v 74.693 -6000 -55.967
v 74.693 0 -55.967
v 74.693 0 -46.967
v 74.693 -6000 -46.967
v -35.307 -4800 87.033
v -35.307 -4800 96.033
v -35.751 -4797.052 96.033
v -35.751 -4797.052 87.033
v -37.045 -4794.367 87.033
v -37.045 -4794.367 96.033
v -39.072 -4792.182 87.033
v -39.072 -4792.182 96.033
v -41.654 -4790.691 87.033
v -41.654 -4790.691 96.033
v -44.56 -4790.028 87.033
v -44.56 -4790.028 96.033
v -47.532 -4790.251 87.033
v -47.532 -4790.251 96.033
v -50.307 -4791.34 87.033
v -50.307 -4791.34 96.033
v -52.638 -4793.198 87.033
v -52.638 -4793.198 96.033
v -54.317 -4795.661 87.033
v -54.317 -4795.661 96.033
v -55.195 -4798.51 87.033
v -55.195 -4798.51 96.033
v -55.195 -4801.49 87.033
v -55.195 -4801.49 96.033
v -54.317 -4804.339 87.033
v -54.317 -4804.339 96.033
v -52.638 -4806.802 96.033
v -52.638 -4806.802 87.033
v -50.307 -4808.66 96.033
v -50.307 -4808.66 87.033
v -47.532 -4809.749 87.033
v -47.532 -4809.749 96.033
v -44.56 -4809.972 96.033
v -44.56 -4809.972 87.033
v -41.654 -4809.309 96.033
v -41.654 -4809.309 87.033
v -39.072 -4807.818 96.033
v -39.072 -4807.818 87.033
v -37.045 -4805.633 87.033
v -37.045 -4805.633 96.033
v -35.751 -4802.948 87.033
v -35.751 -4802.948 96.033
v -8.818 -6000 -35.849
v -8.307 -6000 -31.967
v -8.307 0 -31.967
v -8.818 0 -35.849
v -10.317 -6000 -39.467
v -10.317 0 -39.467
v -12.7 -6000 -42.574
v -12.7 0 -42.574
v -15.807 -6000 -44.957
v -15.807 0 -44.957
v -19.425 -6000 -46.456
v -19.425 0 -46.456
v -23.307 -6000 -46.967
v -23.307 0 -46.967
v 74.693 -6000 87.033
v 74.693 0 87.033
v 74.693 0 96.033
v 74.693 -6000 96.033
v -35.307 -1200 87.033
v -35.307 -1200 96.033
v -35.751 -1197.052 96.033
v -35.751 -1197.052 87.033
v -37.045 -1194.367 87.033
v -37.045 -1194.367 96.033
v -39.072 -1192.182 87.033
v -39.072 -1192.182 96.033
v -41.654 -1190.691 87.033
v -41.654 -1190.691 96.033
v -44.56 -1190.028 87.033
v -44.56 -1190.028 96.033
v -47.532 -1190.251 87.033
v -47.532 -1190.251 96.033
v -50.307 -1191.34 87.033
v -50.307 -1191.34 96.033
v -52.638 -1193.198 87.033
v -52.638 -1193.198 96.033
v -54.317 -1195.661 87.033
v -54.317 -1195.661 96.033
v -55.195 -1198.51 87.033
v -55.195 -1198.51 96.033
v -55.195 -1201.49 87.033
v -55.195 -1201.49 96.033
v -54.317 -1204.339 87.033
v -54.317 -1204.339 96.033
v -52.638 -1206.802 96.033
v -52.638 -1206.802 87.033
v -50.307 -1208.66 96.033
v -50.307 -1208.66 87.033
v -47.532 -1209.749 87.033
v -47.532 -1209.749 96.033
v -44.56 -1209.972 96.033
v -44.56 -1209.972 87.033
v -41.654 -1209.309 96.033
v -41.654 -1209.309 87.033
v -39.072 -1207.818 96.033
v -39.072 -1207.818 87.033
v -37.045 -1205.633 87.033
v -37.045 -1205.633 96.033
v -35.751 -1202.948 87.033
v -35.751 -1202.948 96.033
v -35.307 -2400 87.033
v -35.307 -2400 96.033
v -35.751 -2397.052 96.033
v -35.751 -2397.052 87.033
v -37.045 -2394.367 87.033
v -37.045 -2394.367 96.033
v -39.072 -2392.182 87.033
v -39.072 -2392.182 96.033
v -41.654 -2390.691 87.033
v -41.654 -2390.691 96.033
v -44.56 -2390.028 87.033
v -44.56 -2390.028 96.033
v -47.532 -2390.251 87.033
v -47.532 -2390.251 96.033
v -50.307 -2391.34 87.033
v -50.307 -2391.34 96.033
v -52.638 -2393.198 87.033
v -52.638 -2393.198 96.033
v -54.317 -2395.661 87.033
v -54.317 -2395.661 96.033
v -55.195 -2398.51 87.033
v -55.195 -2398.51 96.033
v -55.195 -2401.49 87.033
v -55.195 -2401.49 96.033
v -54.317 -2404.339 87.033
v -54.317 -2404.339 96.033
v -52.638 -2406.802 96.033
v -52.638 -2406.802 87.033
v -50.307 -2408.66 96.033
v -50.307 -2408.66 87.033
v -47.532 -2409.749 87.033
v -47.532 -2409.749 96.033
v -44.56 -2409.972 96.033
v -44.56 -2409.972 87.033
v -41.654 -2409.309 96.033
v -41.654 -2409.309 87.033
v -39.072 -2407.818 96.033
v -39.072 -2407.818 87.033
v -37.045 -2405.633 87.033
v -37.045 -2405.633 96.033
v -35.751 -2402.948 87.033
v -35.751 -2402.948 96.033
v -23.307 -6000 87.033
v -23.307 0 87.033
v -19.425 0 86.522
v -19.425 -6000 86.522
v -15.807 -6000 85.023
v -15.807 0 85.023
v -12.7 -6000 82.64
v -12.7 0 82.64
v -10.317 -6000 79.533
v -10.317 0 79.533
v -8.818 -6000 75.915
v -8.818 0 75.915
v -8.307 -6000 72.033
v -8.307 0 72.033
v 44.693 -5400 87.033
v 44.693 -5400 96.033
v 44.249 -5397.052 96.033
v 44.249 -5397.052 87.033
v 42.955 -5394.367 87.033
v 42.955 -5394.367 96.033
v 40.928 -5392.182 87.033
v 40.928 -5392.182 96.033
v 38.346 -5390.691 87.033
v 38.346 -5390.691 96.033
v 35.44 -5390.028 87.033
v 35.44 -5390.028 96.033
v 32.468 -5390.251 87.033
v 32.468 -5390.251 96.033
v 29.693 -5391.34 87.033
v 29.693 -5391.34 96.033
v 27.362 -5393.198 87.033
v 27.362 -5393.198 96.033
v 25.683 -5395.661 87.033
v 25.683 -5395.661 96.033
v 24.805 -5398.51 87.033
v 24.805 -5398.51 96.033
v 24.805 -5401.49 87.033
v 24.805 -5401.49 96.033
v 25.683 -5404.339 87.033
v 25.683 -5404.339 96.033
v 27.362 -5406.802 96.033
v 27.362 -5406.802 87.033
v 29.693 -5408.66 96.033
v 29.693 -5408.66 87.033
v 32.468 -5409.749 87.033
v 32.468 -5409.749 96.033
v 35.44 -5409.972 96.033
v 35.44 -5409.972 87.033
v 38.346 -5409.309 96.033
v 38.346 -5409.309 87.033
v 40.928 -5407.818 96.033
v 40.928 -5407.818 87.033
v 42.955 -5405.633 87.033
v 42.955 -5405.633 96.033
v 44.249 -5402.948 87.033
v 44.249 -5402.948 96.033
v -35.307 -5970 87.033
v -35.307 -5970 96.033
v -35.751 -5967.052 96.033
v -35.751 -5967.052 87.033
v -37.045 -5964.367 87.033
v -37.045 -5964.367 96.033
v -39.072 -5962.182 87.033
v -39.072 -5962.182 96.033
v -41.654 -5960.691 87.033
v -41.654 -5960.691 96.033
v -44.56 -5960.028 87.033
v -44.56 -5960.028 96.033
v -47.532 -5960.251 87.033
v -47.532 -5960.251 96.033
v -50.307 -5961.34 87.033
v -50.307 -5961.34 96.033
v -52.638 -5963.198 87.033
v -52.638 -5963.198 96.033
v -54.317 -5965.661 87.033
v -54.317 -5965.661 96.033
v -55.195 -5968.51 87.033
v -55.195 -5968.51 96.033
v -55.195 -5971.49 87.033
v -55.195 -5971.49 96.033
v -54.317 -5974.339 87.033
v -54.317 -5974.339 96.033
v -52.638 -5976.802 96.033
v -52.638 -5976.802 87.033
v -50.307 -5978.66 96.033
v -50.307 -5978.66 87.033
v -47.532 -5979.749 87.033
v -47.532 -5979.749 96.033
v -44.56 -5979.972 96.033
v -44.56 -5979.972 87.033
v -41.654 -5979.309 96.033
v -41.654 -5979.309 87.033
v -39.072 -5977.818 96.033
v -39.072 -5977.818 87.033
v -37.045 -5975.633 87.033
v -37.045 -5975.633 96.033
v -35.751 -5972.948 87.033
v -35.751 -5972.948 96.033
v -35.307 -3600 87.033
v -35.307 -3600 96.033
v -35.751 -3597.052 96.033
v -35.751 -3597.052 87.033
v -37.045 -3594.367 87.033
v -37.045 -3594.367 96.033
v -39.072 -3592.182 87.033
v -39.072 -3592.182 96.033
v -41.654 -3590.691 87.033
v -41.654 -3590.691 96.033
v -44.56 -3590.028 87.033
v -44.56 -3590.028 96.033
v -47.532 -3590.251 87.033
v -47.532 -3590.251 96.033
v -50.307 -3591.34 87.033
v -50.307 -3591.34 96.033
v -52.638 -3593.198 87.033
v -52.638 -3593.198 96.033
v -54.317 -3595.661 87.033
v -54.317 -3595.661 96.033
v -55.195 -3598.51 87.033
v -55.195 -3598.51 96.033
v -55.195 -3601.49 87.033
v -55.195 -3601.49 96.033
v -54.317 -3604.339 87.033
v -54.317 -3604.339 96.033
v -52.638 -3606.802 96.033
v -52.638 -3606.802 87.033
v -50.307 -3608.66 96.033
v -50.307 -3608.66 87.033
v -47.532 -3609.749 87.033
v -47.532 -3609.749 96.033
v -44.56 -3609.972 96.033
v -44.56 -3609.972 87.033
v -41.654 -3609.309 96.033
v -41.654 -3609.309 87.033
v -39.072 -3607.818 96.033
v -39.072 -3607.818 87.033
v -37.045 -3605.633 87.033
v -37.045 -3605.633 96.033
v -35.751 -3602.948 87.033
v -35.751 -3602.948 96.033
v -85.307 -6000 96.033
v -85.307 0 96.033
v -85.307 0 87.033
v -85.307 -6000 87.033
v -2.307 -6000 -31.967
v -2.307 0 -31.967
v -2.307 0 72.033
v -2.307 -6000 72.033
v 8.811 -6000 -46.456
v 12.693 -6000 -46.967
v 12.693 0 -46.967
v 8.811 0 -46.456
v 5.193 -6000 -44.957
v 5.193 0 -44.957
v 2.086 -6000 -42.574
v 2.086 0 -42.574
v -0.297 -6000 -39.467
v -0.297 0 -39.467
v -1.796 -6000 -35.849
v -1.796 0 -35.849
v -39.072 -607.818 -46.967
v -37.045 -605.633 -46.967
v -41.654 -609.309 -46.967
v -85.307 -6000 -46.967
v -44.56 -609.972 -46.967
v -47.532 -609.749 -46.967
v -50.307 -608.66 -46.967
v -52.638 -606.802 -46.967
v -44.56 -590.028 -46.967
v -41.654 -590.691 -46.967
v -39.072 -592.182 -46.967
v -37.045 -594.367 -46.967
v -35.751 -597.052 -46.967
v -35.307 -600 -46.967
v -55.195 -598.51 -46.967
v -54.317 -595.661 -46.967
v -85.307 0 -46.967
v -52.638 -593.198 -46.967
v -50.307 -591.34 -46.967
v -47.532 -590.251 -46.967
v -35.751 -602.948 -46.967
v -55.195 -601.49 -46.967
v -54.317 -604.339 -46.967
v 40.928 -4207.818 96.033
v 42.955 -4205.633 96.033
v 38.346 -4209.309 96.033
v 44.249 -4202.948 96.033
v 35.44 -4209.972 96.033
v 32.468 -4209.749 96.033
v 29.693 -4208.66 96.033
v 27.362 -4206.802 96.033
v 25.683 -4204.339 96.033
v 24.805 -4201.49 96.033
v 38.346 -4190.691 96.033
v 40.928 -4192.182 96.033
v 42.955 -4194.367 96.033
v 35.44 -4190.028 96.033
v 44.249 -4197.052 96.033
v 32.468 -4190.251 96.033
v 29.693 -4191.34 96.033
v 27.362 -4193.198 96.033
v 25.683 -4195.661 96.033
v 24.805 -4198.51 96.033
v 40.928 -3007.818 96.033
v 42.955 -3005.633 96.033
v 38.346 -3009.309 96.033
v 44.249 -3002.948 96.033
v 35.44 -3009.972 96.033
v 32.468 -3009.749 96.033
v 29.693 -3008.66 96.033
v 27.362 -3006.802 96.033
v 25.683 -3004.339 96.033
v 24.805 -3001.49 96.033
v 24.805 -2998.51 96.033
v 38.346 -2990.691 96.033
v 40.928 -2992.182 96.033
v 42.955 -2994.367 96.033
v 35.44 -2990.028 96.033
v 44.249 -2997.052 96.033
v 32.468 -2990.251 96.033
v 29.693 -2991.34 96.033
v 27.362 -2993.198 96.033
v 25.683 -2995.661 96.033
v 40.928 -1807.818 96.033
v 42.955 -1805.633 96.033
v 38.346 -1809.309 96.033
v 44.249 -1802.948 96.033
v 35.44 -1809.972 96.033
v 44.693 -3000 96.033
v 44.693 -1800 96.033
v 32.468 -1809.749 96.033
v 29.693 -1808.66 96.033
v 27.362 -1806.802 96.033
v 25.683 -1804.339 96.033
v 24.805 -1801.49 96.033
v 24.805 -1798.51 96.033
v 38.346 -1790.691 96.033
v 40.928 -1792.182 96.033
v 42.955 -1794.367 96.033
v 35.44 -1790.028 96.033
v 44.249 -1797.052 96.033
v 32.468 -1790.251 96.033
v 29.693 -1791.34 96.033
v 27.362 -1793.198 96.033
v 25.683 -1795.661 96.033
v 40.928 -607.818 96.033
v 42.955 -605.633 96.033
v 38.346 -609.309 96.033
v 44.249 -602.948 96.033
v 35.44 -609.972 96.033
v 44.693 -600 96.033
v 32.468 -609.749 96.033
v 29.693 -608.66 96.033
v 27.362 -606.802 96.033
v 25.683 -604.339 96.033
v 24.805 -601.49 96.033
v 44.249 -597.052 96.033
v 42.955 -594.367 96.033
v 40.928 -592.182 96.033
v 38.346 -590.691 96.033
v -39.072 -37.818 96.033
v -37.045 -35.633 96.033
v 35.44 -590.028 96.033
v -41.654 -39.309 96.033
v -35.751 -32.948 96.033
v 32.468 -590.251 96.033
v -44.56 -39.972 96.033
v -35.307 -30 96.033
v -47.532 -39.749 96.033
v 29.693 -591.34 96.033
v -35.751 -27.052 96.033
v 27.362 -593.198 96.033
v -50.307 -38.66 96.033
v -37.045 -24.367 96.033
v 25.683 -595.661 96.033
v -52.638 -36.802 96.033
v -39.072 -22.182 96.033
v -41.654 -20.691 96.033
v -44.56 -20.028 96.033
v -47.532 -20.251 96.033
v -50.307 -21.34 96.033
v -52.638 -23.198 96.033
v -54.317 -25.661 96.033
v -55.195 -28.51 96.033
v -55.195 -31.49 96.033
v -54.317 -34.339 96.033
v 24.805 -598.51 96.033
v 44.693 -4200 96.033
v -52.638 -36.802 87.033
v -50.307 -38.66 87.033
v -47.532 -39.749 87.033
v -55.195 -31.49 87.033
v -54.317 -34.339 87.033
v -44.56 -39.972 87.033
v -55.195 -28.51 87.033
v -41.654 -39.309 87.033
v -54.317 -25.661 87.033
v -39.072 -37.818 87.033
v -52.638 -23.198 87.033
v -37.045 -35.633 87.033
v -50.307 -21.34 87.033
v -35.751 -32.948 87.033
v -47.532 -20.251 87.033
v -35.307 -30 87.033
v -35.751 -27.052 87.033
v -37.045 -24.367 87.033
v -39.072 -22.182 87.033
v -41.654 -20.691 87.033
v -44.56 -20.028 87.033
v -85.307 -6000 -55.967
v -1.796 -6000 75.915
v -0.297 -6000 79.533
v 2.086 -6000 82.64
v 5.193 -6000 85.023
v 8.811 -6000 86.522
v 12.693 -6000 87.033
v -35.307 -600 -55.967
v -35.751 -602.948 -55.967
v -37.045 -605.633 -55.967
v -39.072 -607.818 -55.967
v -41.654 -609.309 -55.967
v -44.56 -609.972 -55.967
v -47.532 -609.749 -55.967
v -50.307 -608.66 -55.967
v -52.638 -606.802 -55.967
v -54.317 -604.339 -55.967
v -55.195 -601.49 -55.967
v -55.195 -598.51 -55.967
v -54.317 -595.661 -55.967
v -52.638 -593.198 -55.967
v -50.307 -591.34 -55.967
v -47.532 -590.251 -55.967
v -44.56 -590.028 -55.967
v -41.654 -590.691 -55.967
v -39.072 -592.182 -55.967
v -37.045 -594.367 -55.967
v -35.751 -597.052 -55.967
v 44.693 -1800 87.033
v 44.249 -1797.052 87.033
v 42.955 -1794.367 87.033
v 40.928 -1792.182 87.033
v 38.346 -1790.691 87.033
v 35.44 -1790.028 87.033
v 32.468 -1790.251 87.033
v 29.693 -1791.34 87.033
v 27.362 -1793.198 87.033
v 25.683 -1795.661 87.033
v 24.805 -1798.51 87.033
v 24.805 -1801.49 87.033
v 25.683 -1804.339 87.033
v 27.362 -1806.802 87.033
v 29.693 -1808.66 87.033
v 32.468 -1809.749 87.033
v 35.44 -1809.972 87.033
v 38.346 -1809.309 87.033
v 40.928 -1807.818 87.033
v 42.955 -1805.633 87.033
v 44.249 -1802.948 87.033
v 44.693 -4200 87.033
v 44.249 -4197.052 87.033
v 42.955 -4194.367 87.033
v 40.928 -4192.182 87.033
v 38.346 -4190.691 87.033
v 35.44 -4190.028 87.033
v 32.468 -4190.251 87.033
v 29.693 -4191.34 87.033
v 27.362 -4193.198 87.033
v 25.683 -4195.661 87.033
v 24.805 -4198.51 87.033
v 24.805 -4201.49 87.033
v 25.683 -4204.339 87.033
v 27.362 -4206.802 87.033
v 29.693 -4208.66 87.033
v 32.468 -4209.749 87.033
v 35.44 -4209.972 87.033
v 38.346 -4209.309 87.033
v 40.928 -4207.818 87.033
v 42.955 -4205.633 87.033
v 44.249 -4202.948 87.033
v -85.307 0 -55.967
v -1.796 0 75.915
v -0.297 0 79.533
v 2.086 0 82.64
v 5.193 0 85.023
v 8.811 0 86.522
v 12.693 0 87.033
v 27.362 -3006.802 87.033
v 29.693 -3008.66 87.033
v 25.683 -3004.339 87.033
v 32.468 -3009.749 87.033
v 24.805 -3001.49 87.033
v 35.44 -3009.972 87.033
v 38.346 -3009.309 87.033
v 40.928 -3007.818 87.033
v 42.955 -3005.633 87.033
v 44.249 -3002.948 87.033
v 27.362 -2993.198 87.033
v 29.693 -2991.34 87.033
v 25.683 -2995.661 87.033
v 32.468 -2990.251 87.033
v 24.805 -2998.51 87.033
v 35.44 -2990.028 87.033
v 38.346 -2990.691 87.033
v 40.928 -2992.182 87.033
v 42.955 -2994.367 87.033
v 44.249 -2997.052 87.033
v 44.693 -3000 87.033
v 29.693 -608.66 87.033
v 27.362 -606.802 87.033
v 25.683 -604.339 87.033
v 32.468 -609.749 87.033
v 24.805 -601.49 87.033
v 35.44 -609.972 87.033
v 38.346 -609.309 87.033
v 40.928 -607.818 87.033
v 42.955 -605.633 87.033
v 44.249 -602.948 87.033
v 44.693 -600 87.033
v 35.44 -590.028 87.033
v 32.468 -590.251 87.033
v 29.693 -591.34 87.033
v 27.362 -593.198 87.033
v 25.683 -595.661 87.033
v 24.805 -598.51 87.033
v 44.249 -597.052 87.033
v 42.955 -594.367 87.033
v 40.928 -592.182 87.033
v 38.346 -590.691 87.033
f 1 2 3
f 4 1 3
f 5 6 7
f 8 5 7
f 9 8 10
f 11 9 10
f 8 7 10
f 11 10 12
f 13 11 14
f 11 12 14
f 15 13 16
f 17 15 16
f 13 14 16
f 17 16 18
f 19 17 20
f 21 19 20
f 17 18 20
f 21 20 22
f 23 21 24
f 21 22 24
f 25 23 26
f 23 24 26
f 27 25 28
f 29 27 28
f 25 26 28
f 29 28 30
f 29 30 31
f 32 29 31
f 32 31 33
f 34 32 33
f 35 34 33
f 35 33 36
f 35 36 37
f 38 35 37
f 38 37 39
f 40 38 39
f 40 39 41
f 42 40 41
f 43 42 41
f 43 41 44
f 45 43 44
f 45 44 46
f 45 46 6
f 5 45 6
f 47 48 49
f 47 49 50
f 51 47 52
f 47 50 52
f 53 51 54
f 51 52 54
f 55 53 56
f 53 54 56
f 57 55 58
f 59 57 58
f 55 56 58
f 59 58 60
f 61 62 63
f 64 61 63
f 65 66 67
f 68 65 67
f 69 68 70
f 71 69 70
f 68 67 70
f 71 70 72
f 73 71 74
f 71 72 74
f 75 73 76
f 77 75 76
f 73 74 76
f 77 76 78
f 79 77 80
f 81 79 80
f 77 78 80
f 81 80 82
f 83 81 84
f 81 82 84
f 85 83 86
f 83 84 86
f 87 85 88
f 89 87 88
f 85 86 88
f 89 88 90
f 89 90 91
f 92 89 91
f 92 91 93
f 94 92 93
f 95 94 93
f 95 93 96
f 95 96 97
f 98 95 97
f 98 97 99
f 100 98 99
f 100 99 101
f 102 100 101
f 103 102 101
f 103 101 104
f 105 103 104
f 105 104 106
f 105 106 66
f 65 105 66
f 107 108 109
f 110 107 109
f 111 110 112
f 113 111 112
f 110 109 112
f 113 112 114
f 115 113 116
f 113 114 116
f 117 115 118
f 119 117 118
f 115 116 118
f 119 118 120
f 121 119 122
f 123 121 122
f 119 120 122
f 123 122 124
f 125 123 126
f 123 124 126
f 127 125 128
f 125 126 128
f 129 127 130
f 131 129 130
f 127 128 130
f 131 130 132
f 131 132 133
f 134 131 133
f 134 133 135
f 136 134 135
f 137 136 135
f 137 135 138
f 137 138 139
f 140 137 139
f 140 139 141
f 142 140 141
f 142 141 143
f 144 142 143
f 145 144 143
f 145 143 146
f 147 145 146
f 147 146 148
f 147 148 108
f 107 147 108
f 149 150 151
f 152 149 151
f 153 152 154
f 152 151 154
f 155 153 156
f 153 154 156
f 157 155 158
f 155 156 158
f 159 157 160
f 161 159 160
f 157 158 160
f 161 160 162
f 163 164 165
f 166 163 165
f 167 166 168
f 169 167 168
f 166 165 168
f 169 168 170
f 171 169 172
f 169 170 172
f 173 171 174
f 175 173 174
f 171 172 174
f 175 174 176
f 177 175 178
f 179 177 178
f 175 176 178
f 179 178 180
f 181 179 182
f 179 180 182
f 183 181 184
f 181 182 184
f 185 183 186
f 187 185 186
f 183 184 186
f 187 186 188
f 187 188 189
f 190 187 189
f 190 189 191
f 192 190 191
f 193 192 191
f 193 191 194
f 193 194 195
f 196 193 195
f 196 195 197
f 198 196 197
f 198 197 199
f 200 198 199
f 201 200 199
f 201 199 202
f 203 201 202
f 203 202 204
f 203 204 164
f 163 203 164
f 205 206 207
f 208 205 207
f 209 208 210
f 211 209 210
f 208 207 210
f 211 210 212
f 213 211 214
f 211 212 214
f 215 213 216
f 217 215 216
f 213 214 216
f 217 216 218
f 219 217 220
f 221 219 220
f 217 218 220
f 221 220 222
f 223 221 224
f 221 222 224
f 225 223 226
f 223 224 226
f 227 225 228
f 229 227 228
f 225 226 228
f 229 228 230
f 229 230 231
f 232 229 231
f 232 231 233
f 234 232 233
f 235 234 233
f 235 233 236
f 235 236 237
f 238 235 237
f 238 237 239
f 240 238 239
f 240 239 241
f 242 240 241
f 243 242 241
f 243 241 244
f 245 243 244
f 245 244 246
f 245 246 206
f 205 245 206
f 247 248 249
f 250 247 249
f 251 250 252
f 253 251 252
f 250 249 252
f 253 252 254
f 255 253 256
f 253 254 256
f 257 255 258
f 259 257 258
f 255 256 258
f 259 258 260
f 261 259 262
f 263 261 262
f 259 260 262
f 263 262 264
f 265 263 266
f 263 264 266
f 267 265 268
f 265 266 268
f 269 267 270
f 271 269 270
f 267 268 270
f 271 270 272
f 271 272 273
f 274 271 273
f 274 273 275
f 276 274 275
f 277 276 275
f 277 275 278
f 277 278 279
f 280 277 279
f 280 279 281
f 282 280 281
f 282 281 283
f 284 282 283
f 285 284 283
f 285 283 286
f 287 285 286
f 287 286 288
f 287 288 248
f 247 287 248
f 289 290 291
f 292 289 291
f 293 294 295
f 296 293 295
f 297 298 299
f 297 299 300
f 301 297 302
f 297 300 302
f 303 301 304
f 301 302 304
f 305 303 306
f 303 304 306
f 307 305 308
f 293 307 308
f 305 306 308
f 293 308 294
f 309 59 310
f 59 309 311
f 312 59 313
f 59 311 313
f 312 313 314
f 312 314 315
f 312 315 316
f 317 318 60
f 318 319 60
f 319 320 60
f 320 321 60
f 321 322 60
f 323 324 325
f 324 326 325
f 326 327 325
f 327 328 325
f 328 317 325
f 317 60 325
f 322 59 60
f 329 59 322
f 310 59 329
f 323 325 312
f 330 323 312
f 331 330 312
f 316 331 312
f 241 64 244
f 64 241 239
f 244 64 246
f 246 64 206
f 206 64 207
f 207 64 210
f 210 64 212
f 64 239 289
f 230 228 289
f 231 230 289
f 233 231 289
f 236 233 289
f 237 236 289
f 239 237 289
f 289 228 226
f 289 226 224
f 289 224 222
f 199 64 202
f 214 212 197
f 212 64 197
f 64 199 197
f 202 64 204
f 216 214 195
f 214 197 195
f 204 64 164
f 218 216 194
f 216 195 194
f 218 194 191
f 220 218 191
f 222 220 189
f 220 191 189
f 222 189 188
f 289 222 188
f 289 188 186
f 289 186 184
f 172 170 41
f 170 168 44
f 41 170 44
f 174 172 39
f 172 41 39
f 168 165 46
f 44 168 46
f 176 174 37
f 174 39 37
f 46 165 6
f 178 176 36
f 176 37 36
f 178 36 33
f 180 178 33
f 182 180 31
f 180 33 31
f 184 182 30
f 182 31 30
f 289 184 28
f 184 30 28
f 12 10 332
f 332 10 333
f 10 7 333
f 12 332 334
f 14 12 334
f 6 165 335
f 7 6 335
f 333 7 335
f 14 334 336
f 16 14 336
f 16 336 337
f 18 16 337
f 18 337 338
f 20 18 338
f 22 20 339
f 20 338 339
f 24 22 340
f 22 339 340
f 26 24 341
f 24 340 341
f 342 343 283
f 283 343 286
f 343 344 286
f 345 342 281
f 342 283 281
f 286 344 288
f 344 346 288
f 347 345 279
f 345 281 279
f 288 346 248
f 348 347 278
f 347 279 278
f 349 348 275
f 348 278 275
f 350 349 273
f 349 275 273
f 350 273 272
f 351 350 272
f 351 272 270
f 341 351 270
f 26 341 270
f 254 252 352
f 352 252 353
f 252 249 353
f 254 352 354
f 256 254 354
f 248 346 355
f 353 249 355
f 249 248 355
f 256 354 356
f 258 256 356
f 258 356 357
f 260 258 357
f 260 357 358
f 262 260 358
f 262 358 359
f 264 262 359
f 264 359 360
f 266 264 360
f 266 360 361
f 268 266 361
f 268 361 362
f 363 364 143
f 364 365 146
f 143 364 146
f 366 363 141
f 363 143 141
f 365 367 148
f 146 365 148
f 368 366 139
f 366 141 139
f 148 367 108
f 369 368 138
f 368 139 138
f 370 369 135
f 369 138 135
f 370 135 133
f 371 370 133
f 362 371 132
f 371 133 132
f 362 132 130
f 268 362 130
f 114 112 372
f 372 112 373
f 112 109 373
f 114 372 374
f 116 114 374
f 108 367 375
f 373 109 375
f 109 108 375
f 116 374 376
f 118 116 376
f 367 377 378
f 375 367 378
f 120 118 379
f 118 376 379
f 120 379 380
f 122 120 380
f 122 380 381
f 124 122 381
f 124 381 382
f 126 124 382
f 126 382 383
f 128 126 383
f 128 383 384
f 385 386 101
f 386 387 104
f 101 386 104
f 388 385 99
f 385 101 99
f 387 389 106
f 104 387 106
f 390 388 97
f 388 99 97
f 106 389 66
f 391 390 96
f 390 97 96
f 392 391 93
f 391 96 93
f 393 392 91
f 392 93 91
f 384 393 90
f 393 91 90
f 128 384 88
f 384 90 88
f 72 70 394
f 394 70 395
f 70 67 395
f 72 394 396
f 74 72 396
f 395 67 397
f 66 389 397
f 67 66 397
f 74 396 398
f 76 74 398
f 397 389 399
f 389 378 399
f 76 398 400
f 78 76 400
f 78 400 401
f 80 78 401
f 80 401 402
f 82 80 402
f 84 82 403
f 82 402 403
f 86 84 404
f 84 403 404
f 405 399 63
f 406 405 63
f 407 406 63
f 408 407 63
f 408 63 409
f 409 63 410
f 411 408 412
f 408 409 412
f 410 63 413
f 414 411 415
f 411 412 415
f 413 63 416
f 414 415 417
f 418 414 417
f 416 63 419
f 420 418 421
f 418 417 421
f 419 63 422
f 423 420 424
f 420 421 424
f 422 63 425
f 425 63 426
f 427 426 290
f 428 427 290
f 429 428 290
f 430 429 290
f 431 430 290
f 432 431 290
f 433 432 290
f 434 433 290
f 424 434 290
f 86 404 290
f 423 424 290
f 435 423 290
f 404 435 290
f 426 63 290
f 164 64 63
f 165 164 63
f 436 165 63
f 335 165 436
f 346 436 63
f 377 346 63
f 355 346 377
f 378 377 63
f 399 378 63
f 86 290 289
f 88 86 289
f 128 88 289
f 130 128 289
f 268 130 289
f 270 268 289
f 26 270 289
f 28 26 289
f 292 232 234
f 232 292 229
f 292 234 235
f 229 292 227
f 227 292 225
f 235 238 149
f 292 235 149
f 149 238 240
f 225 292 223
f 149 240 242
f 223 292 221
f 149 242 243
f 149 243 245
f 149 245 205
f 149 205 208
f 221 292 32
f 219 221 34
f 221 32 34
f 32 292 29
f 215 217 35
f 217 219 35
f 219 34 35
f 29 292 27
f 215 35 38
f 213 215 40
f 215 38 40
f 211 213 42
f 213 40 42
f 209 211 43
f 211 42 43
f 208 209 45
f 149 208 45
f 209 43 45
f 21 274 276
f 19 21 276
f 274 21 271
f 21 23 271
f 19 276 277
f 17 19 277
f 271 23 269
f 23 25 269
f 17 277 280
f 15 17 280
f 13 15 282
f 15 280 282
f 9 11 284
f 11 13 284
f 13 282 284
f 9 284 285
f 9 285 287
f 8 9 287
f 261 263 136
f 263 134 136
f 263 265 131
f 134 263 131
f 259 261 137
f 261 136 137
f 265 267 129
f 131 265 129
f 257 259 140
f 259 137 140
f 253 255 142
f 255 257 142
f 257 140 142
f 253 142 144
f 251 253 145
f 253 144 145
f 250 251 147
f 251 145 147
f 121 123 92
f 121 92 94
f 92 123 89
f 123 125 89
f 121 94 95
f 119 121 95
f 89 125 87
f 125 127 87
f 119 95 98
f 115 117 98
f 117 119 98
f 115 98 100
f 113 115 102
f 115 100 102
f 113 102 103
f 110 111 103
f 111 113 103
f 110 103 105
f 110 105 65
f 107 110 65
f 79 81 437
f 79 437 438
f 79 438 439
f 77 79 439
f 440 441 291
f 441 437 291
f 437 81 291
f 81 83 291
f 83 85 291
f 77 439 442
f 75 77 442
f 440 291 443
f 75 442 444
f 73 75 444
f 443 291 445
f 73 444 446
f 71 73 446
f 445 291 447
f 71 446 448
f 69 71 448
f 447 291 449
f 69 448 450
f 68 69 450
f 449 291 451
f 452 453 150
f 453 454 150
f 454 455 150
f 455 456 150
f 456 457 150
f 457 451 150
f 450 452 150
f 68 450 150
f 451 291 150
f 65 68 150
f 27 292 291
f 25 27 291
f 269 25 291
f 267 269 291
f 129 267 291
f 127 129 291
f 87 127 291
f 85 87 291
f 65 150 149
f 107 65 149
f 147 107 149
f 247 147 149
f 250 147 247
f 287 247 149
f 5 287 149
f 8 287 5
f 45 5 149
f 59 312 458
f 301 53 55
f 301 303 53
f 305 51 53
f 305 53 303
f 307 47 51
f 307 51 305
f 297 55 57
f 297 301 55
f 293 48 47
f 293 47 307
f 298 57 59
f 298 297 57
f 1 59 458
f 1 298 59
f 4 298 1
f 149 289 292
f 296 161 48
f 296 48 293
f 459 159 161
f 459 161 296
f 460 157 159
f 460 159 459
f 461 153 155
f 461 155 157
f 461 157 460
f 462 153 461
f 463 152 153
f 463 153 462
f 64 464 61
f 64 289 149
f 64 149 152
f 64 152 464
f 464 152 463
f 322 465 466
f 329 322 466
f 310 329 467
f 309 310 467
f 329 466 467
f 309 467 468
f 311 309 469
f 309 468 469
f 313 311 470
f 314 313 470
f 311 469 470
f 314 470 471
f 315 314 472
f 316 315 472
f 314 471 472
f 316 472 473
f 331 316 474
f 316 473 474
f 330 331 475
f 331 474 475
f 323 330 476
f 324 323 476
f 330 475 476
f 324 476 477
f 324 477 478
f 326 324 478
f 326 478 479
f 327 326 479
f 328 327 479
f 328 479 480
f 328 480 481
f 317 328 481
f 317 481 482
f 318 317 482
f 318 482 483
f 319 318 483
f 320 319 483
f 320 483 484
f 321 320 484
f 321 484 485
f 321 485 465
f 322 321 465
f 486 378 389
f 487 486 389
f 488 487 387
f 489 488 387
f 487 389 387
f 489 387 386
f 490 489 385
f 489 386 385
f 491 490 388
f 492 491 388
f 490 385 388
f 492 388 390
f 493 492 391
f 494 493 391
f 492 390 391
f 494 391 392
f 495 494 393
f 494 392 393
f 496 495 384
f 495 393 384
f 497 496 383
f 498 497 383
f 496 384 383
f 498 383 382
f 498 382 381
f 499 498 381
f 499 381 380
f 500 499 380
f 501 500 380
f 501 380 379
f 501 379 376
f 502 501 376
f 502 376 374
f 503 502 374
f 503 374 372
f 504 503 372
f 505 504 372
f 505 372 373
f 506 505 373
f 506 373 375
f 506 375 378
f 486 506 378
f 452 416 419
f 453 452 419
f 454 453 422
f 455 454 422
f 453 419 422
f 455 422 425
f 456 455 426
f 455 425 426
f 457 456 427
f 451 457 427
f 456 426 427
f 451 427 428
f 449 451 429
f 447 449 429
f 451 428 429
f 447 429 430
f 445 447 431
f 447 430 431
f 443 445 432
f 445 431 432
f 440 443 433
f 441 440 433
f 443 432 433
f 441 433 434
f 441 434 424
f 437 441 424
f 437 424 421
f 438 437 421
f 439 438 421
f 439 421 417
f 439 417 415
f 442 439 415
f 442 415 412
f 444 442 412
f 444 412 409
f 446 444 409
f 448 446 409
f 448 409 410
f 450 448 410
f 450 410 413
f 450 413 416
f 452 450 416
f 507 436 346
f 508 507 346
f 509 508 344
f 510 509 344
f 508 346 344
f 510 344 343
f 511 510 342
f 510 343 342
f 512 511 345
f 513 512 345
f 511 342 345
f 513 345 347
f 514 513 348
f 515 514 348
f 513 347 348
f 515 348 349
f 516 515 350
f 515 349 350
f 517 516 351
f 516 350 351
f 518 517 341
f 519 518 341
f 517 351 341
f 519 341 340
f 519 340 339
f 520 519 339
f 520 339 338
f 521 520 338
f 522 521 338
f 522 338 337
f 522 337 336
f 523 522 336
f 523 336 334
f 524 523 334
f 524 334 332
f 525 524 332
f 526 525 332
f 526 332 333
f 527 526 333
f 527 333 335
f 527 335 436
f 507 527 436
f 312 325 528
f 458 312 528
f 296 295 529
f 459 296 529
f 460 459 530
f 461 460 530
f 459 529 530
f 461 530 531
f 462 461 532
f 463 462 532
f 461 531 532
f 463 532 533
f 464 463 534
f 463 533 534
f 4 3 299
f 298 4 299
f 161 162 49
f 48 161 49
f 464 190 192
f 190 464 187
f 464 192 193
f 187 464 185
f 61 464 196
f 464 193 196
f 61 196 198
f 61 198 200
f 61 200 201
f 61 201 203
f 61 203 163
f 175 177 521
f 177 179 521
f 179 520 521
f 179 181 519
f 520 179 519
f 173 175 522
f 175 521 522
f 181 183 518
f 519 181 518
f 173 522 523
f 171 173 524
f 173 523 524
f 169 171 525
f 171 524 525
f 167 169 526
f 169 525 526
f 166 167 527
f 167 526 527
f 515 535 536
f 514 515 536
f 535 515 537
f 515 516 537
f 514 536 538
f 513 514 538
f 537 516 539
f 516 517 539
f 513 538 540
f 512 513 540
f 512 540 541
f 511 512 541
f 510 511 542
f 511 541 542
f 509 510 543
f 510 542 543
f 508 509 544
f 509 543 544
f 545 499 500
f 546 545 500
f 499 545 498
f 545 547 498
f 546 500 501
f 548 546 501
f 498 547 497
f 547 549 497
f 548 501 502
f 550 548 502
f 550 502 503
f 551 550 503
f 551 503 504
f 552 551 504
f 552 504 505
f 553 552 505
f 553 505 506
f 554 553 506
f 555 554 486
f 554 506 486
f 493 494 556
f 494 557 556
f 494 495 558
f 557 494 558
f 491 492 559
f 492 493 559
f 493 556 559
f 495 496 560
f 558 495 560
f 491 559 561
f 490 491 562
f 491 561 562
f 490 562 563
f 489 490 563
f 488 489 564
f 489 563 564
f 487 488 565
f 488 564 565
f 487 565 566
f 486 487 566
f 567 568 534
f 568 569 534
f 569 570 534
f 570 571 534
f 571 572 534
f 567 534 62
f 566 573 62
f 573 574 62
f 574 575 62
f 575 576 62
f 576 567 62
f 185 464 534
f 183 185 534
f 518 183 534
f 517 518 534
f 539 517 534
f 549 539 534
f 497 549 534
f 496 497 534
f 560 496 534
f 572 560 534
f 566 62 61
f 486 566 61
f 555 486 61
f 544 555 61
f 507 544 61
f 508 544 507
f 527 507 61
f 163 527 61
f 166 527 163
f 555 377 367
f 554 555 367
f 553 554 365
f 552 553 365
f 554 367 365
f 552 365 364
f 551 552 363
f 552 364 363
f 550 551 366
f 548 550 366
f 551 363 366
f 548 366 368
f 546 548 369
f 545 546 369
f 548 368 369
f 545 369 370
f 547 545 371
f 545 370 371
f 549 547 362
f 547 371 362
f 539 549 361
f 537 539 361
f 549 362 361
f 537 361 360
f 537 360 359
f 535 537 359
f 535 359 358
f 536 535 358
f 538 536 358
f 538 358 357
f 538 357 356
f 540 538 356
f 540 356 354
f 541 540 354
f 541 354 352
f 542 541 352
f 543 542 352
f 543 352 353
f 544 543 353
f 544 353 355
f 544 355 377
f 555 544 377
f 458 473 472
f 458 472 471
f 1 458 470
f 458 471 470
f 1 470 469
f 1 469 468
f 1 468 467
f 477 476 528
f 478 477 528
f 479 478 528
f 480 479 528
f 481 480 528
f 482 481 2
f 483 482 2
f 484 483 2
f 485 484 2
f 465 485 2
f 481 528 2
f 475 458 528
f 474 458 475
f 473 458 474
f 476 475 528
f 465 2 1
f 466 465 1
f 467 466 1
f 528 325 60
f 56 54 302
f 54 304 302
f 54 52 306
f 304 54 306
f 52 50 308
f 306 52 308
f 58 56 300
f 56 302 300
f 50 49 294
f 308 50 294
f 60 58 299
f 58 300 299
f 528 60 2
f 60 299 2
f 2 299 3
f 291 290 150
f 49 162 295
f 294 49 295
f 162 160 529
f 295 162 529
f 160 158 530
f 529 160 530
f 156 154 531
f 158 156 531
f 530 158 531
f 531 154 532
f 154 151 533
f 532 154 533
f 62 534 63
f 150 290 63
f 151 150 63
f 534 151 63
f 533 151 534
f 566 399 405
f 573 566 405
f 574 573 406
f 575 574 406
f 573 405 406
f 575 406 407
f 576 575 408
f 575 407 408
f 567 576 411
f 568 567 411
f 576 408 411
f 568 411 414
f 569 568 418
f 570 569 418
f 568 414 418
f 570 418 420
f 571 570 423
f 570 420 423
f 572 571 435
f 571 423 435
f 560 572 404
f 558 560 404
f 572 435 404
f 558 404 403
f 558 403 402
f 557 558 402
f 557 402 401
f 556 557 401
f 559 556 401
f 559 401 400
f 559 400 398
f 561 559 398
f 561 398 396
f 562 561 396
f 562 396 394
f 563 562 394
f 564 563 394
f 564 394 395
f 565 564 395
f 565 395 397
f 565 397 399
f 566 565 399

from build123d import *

# Parameters (mm, degrees)
F1_DEPTH = 6000
F2_R     = 10
F3_DEPTH = 25
F4_R     = 10
F5_DEPTH = 25


with BuildPart() as f1:
    # F0 (on Front) → F1 (new body)
    with BuildSketch(Plane.XZ):
        with BuildLine():
            Line((-23.307067, -46.966993), (-85.307067, -46.966993))
            Line((-85.307067, -46.966993), (-85.307067, -55.966993))
            Line((-85.307067, -55.966993), (74.692933, -55.966993))
            Line((74.692933, -55.966993), (74.692933, -46.966993))
            Line((74.692933, -46.966993), (12.692933, -46.966993))
            ThreePointArc((12.692933, -46.966993), (2.086331, -42.573595), (-2.307067, -31.966993))
            Line((-2.307067, -31.966993), (-2.307067, 72.033007))
            ThreePointArc((-2.307067, 72.033007), (2.086331, 82.639608), (12.692933, 87.033007))
            Line((12.692933, 87.033007), (74.692933, 87.033007))
            Line((74.692933, 87.033007), (74.692933, 96.033007))
            Line((74.692933, 96.033007), (-85.307067, 96.033007))
            Line((-85.307067, 96.033007), (-85.307067, 87.033007))
            Line((-85.307067, 87.033007), (-23.307067, 87.033007))
            ThreePointArc((-23.307067, 87.033007), (-12.700465, 82.639608), (-8.307067, 72.033007))
            Line((-8.307067, 72.033007), (-8.307067, -31.966993))
            ThreePointArc((-8.307067, -31.966993), (-12.700465, -42.573595), (-23.307067, -46.966993))
        make_face()
    extrude(amount=F1_DEPTH)

    # F2 (on face) → F3 (cut)
    with BuildSketch(Plane.XY.offset(96.033007)):
        with Locations((34.692933, -6600)):
            Circle(F2_R)
        with Locations((34.692933, -5400)):
            Circle(F2_R)
        with Locations((-45.307067, -5970)):
            Circle(F2_R)
        with Locations((-45.307067, -4800)):
            Circle(F2_R)
        with Locations((34.692933, -4200)):
            Circle(F2_R)
        with Locations((-45.307067, -3600)):
            Circle(F2_R)
        with Locations((34.692933, -3000)):
            Circle(F2_R)
        with Locations((-45.307067, -2400)):
            Circle(F2_R)
        with Locations((34.692933, -1800)):
            Circle(F2_R)
        with Locations((-45.307067, -1200)):
            Circle(F2_R)
        with Locations((34.692933, -600)):
            Circle(F2_R)
        with Locations((-45.307067, -30)):
            Circle(F2_R)
    extrude(amount=-F3_DEPTH, mode=Mode.SUBTRACT)

    # F4 (on face) → F5 (cut)
    with BuildSketch(Plane(origin=(0, 0, -55.966993), x_dir=(1, 0, 0), z_dir=(0, 0, -1))):
        with Locations((-45.307067, 600)):
            Circle(F4_R)
    extrude(amount=-F5_DEPTH, mode=Mode.SUBTRACT)


solid = f1.part
